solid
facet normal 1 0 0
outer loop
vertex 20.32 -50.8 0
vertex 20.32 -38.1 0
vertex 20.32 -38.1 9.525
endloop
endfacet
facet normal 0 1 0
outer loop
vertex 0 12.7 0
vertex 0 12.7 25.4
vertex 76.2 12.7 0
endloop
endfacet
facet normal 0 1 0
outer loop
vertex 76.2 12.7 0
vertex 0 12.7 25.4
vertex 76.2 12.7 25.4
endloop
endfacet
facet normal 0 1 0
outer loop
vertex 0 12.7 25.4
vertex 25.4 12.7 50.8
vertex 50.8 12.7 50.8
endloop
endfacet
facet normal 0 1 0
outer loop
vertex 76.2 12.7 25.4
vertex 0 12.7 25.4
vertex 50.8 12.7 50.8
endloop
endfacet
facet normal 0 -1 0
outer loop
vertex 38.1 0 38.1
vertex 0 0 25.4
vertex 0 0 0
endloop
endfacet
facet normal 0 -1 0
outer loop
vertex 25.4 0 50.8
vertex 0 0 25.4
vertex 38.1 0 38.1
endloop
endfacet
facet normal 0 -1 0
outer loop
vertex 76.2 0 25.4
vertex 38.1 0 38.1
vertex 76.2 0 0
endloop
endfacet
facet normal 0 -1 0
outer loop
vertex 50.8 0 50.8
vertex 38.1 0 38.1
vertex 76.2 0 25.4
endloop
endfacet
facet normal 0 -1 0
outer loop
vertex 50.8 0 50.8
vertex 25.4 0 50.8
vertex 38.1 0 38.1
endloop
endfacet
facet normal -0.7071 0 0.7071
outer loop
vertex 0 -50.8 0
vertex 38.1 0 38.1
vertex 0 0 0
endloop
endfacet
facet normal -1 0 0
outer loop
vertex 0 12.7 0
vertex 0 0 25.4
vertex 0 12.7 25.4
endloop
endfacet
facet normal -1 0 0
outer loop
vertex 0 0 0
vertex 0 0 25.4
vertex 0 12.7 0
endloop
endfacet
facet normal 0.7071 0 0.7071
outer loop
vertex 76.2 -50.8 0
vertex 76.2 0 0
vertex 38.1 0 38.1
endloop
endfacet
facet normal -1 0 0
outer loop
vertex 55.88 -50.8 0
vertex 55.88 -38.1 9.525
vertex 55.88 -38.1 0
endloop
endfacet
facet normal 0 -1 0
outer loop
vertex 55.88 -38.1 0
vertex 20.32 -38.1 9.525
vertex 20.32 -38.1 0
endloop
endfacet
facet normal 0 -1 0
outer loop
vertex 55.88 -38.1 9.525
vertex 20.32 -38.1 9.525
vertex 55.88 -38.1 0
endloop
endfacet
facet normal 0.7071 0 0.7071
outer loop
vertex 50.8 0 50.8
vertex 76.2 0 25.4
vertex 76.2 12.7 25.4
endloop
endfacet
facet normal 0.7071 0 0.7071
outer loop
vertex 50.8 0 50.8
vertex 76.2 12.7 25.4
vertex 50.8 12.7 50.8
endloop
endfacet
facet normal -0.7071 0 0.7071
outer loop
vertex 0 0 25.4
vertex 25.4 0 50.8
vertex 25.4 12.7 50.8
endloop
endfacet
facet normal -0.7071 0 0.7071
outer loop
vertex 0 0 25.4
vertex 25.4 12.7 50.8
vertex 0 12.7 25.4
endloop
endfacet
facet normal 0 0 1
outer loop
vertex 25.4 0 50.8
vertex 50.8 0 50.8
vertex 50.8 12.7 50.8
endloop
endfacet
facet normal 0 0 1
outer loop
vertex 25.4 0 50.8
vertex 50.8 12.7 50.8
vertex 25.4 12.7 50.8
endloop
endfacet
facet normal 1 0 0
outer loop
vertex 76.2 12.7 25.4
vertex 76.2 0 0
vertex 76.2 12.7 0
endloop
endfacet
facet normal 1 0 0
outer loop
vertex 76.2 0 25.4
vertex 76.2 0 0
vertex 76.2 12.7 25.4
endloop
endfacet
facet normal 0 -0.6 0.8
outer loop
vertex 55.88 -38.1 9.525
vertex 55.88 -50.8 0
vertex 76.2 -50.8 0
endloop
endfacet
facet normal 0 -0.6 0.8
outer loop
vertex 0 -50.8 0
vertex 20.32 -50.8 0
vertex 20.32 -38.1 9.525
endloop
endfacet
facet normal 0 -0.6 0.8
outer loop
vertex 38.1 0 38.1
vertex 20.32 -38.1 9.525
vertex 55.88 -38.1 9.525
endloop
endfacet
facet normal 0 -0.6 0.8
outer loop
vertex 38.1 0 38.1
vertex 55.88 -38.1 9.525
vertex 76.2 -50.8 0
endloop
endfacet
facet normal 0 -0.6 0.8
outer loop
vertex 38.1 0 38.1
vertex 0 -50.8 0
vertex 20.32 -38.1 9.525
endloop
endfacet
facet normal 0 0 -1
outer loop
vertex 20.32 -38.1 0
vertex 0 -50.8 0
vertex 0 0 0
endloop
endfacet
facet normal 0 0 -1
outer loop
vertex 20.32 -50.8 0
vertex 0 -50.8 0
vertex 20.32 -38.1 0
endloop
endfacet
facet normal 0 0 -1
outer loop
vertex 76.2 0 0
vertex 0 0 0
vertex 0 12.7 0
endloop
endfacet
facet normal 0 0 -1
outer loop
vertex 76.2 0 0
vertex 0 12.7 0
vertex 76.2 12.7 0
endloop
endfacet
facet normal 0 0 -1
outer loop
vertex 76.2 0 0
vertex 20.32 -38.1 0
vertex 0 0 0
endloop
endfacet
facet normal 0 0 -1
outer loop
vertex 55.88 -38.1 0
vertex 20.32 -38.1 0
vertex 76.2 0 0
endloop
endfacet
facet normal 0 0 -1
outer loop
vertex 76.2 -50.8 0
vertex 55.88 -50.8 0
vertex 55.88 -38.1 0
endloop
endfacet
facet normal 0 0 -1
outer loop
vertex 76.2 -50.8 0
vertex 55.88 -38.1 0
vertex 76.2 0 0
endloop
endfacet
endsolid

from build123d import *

# Parameters (mm, degrees)
F0_W     = 35.56
F0_H     = 12.7
F1_DEPTH = 38.1
F2_DEPTH = 50.8
F4_DEPTH = 76.201
F5_DEPTH = 12.7
F6_DEPTH = 12.7


with BuildPart() as f1:
    # F0 (on Front) → F1 (new body)
    with BuildSketch(Plane.XZ):
        with Locations((38.1, 6.35)):
            Rectangle(F0_W, F0_H)
    extrude(amount=F1_DEPTH)

    # F0 (on Front) → F2 (join)
    with BuildSketch(Plane.XZ):
        Polygon((38.1, 38.1), (0, 0), (20.32, 0), (20.32, 12.7), (55.88, 12.7), (55.88, 0), (76.2, 0), align=None)
    extrude(amount=F2_DEPTH)

    # F3 (on Right) → F4 (cut, through all)
    with BuildSketch(Plane.YZ):
        Polygon((-50.8, 0), (0, 38.1), (-50.8, 38.1), align=None)
    extrude(amount=F4_DEPTH, mode=Mode.SUBTRACT)

    # F0 (on Front) → F5 (join)
    with BuildSketch(Plane.XZ):
        Polygon((0, 25.4), (0, 0), (38.1, 38.1), (76.2, 0), (76.2, 25.4), (50.8, 50.8), (25.4, 50.8), align=None)
    extrude(amount=-F5_DEPTH)

    # F0 (on Front) → F6 (join)
    with BuildSketch(Plane.XZ):
        with Locations((38.1, 6.35)):
            Rectangle(F0_W, F0_H)
        Polygon((0, 25.4), (0, 0), (38.1, 38.1), (76.2, 0), (76.2, 25.4), (50.8, 50.8), (25.4, 50.8), align=None)
        Polygon((38.1, 38.1), (0, 0), (20.32, 0), (20.32, 12.7), (55.88, 12.7), (55.88, 0), (76.2, 0), align=None)
    extrude(amount=-F6_DEPTH)


solid = f1.part
